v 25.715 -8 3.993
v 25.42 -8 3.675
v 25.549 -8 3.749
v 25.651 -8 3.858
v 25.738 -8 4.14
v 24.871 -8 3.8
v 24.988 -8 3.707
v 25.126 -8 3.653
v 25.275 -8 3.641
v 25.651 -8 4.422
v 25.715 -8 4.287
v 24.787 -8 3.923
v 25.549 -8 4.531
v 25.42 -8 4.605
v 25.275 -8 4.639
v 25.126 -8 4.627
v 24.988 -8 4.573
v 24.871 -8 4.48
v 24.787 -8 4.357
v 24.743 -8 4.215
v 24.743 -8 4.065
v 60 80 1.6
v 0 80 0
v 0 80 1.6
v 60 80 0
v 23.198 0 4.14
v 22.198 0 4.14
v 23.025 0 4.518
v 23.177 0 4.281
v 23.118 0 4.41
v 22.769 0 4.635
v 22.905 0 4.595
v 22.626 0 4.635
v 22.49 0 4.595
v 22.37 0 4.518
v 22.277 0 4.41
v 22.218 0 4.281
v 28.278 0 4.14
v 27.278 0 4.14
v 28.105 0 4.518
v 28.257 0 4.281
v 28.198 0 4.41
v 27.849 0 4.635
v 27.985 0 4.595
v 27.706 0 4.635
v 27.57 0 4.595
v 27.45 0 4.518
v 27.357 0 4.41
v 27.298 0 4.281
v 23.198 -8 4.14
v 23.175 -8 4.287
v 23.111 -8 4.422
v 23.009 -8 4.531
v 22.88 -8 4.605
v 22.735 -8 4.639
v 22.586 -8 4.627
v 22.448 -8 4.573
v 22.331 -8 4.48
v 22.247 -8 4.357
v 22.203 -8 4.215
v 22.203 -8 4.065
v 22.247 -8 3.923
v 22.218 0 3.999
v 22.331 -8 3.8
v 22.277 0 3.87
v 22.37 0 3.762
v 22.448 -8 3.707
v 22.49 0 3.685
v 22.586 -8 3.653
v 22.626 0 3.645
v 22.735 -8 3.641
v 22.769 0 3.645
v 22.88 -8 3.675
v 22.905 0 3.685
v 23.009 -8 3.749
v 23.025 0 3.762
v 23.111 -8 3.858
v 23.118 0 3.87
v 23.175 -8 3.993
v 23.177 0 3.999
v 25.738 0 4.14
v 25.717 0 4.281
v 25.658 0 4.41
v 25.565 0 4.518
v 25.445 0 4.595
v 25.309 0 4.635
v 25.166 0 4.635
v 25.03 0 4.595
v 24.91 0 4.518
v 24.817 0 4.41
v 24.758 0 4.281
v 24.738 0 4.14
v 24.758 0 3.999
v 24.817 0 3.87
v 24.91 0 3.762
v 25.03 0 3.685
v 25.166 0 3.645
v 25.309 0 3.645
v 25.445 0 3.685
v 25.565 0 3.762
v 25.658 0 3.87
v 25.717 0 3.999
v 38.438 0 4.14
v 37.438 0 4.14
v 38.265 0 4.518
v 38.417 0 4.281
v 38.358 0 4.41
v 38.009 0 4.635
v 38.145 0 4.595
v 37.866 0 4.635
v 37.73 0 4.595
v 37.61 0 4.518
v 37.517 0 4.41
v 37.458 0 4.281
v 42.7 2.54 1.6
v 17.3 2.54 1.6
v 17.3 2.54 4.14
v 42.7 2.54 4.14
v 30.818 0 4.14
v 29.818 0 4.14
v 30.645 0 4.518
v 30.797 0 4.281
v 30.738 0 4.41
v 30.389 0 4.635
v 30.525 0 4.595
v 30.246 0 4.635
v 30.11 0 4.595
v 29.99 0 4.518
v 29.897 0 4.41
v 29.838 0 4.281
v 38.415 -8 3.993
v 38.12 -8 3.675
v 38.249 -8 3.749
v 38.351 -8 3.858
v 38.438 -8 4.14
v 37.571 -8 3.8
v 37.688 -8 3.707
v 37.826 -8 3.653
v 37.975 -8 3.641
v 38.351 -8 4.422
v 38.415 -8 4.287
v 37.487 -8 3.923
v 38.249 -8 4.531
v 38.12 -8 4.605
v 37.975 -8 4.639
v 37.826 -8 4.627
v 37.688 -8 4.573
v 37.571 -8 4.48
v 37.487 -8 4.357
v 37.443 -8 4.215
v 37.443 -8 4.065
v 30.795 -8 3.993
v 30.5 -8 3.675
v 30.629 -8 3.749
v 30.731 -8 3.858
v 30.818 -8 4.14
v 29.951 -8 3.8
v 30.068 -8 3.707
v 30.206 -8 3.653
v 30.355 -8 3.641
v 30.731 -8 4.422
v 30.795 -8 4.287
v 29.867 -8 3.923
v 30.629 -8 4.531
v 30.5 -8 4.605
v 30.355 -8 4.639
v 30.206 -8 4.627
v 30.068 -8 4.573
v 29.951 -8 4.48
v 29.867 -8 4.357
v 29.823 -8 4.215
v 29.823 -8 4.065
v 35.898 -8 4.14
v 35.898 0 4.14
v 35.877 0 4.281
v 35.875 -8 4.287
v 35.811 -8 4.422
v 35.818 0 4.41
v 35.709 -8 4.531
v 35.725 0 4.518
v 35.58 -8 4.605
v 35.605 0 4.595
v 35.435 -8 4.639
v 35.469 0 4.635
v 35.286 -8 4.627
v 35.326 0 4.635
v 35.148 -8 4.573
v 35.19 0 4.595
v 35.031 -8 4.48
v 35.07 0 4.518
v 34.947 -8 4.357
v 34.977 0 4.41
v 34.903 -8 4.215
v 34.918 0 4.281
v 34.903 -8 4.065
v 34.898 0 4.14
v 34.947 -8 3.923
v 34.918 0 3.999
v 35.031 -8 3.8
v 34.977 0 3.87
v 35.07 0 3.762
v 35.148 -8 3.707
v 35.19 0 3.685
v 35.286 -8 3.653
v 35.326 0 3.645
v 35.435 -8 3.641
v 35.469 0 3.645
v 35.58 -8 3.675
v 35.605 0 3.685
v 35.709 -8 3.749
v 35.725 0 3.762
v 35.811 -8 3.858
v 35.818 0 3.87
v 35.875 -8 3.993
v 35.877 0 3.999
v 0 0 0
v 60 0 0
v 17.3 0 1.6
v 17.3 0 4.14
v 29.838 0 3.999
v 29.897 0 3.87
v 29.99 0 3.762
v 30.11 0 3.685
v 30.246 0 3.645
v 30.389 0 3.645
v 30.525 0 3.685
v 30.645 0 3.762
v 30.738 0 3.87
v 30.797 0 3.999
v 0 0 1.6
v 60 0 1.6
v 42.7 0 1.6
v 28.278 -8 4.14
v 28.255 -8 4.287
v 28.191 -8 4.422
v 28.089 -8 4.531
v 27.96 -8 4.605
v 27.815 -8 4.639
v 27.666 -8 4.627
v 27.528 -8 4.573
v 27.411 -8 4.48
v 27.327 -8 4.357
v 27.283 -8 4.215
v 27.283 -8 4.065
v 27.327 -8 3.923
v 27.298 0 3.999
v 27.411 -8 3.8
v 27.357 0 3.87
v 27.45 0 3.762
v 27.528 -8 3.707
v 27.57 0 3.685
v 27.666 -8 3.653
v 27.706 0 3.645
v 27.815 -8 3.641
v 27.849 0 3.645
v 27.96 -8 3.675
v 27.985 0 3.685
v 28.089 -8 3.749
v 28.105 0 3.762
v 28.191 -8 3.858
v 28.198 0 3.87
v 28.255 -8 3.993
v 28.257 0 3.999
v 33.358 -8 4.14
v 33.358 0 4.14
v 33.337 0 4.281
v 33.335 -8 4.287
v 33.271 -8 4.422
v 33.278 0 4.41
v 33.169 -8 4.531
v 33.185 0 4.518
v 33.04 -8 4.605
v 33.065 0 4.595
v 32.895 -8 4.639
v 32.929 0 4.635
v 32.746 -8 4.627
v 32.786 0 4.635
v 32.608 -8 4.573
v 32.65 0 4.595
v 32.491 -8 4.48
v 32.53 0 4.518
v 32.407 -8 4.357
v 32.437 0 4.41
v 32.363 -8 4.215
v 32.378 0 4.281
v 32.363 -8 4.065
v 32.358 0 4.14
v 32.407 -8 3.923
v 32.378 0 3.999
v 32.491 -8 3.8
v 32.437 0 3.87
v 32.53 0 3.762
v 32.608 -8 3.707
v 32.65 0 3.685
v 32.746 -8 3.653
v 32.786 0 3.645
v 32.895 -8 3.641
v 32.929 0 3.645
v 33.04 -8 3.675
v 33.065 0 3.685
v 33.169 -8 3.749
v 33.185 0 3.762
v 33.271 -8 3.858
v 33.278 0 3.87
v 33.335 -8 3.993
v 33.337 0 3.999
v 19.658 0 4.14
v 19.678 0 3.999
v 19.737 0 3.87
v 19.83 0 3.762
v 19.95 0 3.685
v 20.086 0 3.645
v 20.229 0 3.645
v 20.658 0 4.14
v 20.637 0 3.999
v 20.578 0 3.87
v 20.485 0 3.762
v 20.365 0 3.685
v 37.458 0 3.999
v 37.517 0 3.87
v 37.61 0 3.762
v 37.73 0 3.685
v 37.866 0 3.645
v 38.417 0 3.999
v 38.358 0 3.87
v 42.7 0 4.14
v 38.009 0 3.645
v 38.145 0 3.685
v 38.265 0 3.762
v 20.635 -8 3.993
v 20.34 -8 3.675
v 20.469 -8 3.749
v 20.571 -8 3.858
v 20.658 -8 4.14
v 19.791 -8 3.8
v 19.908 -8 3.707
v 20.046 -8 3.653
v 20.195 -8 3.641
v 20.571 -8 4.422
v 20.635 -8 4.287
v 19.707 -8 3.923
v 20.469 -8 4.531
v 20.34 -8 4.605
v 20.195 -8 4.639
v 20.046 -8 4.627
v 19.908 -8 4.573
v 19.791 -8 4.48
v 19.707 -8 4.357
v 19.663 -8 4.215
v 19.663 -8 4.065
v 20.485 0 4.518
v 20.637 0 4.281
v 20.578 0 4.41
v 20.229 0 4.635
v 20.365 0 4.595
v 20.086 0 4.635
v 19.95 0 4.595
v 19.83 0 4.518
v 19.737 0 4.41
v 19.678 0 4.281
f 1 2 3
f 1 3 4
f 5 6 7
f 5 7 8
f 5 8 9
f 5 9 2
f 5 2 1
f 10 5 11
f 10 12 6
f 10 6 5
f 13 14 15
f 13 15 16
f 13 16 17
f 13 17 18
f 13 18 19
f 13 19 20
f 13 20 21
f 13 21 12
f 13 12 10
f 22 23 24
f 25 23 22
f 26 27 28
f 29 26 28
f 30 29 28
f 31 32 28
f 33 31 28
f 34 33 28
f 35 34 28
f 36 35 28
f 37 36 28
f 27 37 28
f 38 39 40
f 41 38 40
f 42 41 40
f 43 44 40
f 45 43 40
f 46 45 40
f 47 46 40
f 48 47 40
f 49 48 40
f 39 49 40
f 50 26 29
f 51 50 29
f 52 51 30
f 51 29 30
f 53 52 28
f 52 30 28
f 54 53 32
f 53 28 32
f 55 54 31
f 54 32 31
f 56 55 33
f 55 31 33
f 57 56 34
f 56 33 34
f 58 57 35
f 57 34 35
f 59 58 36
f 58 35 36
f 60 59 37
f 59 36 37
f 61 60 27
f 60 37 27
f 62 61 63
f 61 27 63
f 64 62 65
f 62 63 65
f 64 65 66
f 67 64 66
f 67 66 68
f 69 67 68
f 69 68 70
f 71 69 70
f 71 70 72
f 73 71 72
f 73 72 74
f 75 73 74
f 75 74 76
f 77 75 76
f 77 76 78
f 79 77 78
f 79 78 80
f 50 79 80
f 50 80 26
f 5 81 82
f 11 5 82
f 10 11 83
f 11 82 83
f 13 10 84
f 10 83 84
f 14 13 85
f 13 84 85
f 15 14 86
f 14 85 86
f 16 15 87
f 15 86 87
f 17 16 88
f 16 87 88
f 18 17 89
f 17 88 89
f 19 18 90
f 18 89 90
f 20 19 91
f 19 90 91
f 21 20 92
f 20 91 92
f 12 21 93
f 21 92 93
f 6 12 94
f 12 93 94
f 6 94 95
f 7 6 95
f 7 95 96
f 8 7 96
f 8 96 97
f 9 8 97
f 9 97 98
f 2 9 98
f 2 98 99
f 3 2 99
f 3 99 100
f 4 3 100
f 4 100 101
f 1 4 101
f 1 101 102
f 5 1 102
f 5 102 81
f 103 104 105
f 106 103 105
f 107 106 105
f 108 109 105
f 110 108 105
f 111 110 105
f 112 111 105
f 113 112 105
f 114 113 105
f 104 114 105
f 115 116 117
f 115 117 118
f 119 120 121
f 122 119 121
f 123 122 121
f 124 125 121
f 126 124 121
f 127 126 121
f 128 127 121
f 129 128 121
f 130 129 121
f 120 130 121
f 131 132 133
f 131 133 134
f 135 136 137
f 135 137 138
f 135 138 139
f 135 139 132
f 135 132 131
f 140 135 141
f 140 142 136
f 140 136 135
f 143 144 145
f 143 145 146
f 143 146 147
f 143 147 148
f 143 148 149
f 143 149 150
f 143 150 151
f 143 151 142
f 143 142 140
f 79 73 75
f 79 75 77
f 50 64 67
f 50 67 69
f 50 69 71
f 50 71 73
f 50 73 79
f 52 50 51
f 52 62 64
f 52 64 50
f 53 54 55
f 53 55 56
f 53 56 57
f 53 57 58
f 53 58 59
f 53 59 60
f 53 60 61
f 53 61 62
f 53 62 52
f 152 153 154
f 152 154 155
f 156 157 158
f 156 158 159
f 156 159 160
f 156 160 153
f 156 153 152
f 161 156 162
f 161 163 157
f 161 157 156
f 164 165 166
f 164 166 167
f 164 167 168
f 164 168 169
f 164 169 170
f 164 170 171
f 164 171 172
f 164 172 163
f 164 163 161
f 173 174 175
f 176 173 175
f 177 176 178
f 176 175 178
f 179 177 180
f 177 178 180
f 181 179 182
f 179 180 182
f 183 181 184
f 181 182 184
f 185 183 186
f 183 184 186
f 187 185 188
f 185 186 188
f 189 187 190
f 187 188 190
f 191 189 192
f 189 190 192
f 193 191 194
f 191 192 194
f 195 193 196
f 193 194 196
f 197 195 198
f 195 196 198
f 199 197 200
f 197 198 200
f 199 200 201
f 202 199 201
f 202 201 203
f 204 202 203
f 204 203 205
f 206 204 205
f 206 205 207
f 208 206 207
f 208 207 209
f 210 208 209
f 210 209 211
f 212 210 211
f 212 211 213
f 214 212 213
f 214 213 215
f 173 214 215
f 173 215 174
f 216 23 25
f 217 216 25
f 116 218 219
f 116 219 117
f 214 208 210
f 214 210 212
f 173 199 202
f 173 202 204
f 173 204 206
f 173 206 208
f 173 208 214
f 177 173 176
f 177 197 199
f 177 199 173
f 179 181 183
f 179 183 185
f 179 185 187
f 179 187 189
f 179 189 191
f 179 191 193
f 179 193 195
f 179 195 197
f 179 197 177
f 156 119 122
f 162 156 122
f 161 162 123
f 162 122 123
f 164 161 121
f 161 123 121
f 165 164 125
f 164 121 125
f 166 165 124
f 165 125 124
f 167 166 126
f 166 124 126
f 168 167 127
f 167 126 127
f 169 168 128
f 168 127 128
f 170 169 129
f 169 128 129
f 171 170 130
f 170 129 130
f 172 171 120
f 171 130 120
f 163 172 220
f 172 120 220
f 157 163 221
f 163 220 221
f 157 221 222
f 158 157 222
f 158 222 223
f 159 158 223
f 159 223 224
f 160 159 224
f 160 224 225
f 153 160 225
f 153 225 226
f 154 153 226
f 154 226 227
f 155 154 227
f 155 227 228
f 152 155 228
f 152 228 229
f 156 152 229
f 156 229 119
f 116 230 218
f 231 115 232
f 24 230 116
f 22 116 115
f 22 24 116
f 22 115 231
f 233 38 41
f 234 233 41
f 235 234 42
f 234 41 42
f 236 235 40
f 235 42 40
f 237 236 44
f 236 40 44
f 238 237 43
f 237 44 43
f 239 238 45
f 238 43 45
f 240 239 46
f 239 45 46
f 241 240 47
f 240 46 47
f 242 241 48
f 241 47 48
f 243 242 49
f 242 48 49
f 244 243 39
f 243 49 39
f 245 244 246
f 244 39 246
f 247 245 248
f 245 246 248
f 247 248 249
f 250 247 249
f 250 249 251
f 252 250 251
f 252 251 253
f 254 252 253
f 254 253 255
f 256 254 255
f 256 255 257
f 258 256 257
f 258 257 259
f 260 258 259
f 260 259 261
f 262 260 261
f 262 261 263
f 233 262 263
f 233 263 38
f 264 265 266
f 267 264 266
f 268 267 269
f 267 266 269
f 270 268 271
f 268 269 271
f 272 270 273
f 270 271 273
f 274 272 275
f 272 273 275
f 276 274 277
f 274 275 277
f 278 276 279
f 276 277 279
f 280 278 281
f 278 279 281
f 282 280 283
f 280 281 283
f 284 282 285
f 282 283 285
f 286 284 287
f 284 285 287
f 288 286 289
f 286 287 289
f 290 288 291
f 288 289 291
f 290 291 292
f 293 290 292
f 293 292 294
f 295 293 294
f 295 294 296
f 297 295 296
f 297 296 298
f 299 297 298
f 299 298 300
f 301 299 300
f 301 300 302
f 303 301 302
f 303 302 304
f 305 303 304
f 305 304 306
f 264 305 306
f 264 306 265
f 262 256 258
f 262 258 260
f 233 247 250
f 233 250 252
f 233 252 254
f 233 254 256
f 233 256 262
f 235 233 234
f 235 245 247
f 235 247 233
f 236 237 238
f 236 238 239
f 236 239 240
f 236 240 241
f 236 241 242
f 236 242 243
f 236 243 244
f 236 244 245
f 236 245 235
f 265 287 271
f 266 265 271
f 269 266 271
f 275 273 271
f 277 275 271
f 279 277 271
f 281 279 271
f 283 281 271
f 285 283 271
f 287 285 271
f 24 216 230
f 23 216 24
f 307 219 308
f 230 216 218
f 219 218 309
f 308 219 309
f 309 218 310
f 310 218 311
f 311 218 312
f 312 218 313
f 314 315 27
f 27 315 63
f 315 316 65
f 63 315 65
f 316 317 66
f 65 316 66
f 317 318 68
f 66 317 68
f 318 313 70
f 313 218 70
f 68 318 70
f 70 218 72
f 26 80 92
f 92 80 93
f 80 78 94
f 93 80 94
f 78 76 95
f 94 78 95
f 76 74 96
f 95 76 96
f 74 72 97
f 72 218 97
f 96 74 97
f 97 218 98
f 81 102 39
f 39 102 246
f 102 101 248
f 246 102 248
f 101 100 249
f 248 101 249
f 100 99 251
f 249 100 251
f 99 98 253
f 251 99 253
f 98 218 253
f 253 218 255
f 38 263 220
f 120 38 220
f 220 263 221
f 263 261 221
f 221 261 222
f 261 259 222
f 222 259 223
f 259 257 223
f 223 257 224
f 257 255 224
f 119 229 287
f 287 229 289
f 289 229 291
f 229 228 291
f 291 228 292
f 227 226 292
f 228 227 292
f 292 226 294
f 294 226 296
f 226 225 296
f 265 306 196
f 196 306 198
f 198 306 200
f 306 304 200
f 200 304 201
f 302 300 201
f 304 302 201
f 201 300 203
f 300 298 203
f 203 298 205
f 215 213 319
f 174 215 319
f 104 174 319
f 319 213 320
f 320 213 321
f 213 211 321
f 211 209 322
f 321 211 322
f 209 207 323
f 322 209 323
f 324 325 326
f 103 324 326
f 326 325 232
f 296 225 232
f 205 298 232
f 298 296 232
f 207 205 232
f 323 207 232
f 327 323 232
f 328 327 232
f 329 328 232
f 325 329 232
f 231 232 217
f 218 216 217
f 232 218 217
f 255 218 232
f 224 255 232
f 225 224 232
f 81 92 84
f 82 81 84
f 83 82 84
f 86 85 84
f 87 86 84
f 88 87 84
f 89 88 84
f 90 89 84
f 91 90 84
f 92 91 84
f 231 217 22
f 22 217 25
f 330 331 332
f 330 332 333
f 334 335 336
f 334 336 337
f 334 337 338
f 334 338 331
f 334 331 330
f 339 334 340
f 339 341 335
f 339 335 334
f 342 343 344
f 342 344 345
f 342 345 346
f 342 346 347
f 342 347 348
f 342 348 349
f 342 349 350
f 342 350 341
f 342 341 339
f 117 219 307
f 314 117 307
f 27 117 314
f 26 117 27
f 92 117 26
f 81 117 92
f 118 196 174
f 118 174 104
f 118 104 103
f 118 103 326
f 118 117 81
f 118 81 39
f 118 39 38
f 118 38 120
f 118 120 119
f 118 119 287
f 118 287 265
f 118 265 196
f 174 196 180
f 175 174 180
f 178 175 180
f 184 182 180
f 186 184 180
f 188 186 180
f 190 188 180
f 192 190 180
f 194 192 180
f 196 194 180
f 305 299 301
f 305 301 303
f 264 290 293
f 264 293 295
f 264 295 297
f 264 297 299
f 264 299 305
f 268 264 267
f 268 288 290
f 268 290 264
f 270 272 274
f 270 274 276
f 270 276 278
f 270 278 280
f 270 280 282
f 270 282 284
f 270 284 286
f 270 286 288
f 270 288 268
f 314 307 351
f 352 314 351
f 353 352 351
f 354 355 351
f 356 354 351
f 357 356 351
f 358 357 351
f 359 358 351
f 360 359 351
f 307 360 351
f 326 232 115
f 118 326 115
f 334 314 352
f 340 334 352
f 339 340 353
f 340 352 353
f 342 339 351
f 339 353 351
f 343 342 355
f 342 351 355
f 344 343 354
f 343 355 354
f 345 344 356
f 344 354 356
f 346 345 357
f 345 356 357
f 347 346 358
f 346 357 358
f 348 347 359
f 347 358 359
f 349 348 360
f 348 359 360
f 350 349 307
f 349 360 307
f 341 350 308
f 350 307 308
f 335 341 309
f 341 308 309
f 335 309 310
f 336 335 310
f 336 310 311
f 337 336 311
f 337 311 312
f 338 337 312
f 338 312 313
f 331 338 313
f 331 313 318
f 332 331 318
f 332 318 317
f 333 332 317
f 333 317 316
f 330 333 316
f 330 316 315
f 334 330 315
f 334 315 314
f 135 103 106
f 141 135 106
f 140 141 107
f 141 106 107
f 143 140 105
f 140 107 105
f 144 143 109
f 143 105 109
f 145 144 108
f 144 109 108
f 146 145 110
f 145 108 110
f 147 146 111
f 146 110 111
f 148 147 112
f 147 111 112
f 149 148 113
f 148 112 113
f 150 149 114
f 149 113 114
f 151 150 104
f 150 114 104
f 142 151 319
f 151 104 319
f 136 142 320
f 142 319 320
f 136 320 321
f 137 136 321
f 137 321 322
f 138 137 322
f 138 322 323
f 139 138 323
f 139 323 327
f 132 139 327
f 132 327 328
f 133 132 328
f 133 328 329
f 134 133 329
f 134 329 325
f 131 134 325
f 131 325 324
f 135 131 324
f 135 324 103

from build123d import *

# Parameters (mm, degrees)
F0_W     = 60
F0_H     = 80
F1_DEPTH = 1.6
F2_W     = 25.4
F2_H     = 2.54
F3_DEPTH = 2.54
F4_R     = 0.5
F5_DEPTH = 8


with BuildPart() as f1:
    # F0 (on Top) → F1 (new body)
    with BuildSketch(Plane.XY):
        with Locations((30, 40)):
            Rectangle(F0_W, F0_H)
    extrude(amount=F1_DEPTH)

    # F2 (on face) → F3 (join)
    with BuildSketch(Plane.XY.offset(1.6)):
        with Locations((30, 1.27)):
            Rectangle(F2_W, F2_H)
    extrude(amount=F3_DEPTH)

    # F4 (on face) → F5 (join)
    with BuildSketch(Plane.XZ):
        with Locations((20.157567, 4.14)):
            Circle(F4_R)
        with Locations((22.697567, 4.14)):
            Circle(F4_R)
        with Locations((25.237567, 4.14)):
            Circle(F4_R)
        with Locations((27.777567, 4.14)):
            Circle(F4_R)
        with Locations((30.317567, 4.14)):
            Circle(F4_R)
        with Locations((32.857567, 4.14)):
            Circle(F4_R)
        with Locations((35.397567, 4.14)):
            Circle(F4_R)
        with Locations((37.937567, 4.14)):
            Circle(F4_R)
    extrude(amount=F5_DEPTH)


solid = f1.part
